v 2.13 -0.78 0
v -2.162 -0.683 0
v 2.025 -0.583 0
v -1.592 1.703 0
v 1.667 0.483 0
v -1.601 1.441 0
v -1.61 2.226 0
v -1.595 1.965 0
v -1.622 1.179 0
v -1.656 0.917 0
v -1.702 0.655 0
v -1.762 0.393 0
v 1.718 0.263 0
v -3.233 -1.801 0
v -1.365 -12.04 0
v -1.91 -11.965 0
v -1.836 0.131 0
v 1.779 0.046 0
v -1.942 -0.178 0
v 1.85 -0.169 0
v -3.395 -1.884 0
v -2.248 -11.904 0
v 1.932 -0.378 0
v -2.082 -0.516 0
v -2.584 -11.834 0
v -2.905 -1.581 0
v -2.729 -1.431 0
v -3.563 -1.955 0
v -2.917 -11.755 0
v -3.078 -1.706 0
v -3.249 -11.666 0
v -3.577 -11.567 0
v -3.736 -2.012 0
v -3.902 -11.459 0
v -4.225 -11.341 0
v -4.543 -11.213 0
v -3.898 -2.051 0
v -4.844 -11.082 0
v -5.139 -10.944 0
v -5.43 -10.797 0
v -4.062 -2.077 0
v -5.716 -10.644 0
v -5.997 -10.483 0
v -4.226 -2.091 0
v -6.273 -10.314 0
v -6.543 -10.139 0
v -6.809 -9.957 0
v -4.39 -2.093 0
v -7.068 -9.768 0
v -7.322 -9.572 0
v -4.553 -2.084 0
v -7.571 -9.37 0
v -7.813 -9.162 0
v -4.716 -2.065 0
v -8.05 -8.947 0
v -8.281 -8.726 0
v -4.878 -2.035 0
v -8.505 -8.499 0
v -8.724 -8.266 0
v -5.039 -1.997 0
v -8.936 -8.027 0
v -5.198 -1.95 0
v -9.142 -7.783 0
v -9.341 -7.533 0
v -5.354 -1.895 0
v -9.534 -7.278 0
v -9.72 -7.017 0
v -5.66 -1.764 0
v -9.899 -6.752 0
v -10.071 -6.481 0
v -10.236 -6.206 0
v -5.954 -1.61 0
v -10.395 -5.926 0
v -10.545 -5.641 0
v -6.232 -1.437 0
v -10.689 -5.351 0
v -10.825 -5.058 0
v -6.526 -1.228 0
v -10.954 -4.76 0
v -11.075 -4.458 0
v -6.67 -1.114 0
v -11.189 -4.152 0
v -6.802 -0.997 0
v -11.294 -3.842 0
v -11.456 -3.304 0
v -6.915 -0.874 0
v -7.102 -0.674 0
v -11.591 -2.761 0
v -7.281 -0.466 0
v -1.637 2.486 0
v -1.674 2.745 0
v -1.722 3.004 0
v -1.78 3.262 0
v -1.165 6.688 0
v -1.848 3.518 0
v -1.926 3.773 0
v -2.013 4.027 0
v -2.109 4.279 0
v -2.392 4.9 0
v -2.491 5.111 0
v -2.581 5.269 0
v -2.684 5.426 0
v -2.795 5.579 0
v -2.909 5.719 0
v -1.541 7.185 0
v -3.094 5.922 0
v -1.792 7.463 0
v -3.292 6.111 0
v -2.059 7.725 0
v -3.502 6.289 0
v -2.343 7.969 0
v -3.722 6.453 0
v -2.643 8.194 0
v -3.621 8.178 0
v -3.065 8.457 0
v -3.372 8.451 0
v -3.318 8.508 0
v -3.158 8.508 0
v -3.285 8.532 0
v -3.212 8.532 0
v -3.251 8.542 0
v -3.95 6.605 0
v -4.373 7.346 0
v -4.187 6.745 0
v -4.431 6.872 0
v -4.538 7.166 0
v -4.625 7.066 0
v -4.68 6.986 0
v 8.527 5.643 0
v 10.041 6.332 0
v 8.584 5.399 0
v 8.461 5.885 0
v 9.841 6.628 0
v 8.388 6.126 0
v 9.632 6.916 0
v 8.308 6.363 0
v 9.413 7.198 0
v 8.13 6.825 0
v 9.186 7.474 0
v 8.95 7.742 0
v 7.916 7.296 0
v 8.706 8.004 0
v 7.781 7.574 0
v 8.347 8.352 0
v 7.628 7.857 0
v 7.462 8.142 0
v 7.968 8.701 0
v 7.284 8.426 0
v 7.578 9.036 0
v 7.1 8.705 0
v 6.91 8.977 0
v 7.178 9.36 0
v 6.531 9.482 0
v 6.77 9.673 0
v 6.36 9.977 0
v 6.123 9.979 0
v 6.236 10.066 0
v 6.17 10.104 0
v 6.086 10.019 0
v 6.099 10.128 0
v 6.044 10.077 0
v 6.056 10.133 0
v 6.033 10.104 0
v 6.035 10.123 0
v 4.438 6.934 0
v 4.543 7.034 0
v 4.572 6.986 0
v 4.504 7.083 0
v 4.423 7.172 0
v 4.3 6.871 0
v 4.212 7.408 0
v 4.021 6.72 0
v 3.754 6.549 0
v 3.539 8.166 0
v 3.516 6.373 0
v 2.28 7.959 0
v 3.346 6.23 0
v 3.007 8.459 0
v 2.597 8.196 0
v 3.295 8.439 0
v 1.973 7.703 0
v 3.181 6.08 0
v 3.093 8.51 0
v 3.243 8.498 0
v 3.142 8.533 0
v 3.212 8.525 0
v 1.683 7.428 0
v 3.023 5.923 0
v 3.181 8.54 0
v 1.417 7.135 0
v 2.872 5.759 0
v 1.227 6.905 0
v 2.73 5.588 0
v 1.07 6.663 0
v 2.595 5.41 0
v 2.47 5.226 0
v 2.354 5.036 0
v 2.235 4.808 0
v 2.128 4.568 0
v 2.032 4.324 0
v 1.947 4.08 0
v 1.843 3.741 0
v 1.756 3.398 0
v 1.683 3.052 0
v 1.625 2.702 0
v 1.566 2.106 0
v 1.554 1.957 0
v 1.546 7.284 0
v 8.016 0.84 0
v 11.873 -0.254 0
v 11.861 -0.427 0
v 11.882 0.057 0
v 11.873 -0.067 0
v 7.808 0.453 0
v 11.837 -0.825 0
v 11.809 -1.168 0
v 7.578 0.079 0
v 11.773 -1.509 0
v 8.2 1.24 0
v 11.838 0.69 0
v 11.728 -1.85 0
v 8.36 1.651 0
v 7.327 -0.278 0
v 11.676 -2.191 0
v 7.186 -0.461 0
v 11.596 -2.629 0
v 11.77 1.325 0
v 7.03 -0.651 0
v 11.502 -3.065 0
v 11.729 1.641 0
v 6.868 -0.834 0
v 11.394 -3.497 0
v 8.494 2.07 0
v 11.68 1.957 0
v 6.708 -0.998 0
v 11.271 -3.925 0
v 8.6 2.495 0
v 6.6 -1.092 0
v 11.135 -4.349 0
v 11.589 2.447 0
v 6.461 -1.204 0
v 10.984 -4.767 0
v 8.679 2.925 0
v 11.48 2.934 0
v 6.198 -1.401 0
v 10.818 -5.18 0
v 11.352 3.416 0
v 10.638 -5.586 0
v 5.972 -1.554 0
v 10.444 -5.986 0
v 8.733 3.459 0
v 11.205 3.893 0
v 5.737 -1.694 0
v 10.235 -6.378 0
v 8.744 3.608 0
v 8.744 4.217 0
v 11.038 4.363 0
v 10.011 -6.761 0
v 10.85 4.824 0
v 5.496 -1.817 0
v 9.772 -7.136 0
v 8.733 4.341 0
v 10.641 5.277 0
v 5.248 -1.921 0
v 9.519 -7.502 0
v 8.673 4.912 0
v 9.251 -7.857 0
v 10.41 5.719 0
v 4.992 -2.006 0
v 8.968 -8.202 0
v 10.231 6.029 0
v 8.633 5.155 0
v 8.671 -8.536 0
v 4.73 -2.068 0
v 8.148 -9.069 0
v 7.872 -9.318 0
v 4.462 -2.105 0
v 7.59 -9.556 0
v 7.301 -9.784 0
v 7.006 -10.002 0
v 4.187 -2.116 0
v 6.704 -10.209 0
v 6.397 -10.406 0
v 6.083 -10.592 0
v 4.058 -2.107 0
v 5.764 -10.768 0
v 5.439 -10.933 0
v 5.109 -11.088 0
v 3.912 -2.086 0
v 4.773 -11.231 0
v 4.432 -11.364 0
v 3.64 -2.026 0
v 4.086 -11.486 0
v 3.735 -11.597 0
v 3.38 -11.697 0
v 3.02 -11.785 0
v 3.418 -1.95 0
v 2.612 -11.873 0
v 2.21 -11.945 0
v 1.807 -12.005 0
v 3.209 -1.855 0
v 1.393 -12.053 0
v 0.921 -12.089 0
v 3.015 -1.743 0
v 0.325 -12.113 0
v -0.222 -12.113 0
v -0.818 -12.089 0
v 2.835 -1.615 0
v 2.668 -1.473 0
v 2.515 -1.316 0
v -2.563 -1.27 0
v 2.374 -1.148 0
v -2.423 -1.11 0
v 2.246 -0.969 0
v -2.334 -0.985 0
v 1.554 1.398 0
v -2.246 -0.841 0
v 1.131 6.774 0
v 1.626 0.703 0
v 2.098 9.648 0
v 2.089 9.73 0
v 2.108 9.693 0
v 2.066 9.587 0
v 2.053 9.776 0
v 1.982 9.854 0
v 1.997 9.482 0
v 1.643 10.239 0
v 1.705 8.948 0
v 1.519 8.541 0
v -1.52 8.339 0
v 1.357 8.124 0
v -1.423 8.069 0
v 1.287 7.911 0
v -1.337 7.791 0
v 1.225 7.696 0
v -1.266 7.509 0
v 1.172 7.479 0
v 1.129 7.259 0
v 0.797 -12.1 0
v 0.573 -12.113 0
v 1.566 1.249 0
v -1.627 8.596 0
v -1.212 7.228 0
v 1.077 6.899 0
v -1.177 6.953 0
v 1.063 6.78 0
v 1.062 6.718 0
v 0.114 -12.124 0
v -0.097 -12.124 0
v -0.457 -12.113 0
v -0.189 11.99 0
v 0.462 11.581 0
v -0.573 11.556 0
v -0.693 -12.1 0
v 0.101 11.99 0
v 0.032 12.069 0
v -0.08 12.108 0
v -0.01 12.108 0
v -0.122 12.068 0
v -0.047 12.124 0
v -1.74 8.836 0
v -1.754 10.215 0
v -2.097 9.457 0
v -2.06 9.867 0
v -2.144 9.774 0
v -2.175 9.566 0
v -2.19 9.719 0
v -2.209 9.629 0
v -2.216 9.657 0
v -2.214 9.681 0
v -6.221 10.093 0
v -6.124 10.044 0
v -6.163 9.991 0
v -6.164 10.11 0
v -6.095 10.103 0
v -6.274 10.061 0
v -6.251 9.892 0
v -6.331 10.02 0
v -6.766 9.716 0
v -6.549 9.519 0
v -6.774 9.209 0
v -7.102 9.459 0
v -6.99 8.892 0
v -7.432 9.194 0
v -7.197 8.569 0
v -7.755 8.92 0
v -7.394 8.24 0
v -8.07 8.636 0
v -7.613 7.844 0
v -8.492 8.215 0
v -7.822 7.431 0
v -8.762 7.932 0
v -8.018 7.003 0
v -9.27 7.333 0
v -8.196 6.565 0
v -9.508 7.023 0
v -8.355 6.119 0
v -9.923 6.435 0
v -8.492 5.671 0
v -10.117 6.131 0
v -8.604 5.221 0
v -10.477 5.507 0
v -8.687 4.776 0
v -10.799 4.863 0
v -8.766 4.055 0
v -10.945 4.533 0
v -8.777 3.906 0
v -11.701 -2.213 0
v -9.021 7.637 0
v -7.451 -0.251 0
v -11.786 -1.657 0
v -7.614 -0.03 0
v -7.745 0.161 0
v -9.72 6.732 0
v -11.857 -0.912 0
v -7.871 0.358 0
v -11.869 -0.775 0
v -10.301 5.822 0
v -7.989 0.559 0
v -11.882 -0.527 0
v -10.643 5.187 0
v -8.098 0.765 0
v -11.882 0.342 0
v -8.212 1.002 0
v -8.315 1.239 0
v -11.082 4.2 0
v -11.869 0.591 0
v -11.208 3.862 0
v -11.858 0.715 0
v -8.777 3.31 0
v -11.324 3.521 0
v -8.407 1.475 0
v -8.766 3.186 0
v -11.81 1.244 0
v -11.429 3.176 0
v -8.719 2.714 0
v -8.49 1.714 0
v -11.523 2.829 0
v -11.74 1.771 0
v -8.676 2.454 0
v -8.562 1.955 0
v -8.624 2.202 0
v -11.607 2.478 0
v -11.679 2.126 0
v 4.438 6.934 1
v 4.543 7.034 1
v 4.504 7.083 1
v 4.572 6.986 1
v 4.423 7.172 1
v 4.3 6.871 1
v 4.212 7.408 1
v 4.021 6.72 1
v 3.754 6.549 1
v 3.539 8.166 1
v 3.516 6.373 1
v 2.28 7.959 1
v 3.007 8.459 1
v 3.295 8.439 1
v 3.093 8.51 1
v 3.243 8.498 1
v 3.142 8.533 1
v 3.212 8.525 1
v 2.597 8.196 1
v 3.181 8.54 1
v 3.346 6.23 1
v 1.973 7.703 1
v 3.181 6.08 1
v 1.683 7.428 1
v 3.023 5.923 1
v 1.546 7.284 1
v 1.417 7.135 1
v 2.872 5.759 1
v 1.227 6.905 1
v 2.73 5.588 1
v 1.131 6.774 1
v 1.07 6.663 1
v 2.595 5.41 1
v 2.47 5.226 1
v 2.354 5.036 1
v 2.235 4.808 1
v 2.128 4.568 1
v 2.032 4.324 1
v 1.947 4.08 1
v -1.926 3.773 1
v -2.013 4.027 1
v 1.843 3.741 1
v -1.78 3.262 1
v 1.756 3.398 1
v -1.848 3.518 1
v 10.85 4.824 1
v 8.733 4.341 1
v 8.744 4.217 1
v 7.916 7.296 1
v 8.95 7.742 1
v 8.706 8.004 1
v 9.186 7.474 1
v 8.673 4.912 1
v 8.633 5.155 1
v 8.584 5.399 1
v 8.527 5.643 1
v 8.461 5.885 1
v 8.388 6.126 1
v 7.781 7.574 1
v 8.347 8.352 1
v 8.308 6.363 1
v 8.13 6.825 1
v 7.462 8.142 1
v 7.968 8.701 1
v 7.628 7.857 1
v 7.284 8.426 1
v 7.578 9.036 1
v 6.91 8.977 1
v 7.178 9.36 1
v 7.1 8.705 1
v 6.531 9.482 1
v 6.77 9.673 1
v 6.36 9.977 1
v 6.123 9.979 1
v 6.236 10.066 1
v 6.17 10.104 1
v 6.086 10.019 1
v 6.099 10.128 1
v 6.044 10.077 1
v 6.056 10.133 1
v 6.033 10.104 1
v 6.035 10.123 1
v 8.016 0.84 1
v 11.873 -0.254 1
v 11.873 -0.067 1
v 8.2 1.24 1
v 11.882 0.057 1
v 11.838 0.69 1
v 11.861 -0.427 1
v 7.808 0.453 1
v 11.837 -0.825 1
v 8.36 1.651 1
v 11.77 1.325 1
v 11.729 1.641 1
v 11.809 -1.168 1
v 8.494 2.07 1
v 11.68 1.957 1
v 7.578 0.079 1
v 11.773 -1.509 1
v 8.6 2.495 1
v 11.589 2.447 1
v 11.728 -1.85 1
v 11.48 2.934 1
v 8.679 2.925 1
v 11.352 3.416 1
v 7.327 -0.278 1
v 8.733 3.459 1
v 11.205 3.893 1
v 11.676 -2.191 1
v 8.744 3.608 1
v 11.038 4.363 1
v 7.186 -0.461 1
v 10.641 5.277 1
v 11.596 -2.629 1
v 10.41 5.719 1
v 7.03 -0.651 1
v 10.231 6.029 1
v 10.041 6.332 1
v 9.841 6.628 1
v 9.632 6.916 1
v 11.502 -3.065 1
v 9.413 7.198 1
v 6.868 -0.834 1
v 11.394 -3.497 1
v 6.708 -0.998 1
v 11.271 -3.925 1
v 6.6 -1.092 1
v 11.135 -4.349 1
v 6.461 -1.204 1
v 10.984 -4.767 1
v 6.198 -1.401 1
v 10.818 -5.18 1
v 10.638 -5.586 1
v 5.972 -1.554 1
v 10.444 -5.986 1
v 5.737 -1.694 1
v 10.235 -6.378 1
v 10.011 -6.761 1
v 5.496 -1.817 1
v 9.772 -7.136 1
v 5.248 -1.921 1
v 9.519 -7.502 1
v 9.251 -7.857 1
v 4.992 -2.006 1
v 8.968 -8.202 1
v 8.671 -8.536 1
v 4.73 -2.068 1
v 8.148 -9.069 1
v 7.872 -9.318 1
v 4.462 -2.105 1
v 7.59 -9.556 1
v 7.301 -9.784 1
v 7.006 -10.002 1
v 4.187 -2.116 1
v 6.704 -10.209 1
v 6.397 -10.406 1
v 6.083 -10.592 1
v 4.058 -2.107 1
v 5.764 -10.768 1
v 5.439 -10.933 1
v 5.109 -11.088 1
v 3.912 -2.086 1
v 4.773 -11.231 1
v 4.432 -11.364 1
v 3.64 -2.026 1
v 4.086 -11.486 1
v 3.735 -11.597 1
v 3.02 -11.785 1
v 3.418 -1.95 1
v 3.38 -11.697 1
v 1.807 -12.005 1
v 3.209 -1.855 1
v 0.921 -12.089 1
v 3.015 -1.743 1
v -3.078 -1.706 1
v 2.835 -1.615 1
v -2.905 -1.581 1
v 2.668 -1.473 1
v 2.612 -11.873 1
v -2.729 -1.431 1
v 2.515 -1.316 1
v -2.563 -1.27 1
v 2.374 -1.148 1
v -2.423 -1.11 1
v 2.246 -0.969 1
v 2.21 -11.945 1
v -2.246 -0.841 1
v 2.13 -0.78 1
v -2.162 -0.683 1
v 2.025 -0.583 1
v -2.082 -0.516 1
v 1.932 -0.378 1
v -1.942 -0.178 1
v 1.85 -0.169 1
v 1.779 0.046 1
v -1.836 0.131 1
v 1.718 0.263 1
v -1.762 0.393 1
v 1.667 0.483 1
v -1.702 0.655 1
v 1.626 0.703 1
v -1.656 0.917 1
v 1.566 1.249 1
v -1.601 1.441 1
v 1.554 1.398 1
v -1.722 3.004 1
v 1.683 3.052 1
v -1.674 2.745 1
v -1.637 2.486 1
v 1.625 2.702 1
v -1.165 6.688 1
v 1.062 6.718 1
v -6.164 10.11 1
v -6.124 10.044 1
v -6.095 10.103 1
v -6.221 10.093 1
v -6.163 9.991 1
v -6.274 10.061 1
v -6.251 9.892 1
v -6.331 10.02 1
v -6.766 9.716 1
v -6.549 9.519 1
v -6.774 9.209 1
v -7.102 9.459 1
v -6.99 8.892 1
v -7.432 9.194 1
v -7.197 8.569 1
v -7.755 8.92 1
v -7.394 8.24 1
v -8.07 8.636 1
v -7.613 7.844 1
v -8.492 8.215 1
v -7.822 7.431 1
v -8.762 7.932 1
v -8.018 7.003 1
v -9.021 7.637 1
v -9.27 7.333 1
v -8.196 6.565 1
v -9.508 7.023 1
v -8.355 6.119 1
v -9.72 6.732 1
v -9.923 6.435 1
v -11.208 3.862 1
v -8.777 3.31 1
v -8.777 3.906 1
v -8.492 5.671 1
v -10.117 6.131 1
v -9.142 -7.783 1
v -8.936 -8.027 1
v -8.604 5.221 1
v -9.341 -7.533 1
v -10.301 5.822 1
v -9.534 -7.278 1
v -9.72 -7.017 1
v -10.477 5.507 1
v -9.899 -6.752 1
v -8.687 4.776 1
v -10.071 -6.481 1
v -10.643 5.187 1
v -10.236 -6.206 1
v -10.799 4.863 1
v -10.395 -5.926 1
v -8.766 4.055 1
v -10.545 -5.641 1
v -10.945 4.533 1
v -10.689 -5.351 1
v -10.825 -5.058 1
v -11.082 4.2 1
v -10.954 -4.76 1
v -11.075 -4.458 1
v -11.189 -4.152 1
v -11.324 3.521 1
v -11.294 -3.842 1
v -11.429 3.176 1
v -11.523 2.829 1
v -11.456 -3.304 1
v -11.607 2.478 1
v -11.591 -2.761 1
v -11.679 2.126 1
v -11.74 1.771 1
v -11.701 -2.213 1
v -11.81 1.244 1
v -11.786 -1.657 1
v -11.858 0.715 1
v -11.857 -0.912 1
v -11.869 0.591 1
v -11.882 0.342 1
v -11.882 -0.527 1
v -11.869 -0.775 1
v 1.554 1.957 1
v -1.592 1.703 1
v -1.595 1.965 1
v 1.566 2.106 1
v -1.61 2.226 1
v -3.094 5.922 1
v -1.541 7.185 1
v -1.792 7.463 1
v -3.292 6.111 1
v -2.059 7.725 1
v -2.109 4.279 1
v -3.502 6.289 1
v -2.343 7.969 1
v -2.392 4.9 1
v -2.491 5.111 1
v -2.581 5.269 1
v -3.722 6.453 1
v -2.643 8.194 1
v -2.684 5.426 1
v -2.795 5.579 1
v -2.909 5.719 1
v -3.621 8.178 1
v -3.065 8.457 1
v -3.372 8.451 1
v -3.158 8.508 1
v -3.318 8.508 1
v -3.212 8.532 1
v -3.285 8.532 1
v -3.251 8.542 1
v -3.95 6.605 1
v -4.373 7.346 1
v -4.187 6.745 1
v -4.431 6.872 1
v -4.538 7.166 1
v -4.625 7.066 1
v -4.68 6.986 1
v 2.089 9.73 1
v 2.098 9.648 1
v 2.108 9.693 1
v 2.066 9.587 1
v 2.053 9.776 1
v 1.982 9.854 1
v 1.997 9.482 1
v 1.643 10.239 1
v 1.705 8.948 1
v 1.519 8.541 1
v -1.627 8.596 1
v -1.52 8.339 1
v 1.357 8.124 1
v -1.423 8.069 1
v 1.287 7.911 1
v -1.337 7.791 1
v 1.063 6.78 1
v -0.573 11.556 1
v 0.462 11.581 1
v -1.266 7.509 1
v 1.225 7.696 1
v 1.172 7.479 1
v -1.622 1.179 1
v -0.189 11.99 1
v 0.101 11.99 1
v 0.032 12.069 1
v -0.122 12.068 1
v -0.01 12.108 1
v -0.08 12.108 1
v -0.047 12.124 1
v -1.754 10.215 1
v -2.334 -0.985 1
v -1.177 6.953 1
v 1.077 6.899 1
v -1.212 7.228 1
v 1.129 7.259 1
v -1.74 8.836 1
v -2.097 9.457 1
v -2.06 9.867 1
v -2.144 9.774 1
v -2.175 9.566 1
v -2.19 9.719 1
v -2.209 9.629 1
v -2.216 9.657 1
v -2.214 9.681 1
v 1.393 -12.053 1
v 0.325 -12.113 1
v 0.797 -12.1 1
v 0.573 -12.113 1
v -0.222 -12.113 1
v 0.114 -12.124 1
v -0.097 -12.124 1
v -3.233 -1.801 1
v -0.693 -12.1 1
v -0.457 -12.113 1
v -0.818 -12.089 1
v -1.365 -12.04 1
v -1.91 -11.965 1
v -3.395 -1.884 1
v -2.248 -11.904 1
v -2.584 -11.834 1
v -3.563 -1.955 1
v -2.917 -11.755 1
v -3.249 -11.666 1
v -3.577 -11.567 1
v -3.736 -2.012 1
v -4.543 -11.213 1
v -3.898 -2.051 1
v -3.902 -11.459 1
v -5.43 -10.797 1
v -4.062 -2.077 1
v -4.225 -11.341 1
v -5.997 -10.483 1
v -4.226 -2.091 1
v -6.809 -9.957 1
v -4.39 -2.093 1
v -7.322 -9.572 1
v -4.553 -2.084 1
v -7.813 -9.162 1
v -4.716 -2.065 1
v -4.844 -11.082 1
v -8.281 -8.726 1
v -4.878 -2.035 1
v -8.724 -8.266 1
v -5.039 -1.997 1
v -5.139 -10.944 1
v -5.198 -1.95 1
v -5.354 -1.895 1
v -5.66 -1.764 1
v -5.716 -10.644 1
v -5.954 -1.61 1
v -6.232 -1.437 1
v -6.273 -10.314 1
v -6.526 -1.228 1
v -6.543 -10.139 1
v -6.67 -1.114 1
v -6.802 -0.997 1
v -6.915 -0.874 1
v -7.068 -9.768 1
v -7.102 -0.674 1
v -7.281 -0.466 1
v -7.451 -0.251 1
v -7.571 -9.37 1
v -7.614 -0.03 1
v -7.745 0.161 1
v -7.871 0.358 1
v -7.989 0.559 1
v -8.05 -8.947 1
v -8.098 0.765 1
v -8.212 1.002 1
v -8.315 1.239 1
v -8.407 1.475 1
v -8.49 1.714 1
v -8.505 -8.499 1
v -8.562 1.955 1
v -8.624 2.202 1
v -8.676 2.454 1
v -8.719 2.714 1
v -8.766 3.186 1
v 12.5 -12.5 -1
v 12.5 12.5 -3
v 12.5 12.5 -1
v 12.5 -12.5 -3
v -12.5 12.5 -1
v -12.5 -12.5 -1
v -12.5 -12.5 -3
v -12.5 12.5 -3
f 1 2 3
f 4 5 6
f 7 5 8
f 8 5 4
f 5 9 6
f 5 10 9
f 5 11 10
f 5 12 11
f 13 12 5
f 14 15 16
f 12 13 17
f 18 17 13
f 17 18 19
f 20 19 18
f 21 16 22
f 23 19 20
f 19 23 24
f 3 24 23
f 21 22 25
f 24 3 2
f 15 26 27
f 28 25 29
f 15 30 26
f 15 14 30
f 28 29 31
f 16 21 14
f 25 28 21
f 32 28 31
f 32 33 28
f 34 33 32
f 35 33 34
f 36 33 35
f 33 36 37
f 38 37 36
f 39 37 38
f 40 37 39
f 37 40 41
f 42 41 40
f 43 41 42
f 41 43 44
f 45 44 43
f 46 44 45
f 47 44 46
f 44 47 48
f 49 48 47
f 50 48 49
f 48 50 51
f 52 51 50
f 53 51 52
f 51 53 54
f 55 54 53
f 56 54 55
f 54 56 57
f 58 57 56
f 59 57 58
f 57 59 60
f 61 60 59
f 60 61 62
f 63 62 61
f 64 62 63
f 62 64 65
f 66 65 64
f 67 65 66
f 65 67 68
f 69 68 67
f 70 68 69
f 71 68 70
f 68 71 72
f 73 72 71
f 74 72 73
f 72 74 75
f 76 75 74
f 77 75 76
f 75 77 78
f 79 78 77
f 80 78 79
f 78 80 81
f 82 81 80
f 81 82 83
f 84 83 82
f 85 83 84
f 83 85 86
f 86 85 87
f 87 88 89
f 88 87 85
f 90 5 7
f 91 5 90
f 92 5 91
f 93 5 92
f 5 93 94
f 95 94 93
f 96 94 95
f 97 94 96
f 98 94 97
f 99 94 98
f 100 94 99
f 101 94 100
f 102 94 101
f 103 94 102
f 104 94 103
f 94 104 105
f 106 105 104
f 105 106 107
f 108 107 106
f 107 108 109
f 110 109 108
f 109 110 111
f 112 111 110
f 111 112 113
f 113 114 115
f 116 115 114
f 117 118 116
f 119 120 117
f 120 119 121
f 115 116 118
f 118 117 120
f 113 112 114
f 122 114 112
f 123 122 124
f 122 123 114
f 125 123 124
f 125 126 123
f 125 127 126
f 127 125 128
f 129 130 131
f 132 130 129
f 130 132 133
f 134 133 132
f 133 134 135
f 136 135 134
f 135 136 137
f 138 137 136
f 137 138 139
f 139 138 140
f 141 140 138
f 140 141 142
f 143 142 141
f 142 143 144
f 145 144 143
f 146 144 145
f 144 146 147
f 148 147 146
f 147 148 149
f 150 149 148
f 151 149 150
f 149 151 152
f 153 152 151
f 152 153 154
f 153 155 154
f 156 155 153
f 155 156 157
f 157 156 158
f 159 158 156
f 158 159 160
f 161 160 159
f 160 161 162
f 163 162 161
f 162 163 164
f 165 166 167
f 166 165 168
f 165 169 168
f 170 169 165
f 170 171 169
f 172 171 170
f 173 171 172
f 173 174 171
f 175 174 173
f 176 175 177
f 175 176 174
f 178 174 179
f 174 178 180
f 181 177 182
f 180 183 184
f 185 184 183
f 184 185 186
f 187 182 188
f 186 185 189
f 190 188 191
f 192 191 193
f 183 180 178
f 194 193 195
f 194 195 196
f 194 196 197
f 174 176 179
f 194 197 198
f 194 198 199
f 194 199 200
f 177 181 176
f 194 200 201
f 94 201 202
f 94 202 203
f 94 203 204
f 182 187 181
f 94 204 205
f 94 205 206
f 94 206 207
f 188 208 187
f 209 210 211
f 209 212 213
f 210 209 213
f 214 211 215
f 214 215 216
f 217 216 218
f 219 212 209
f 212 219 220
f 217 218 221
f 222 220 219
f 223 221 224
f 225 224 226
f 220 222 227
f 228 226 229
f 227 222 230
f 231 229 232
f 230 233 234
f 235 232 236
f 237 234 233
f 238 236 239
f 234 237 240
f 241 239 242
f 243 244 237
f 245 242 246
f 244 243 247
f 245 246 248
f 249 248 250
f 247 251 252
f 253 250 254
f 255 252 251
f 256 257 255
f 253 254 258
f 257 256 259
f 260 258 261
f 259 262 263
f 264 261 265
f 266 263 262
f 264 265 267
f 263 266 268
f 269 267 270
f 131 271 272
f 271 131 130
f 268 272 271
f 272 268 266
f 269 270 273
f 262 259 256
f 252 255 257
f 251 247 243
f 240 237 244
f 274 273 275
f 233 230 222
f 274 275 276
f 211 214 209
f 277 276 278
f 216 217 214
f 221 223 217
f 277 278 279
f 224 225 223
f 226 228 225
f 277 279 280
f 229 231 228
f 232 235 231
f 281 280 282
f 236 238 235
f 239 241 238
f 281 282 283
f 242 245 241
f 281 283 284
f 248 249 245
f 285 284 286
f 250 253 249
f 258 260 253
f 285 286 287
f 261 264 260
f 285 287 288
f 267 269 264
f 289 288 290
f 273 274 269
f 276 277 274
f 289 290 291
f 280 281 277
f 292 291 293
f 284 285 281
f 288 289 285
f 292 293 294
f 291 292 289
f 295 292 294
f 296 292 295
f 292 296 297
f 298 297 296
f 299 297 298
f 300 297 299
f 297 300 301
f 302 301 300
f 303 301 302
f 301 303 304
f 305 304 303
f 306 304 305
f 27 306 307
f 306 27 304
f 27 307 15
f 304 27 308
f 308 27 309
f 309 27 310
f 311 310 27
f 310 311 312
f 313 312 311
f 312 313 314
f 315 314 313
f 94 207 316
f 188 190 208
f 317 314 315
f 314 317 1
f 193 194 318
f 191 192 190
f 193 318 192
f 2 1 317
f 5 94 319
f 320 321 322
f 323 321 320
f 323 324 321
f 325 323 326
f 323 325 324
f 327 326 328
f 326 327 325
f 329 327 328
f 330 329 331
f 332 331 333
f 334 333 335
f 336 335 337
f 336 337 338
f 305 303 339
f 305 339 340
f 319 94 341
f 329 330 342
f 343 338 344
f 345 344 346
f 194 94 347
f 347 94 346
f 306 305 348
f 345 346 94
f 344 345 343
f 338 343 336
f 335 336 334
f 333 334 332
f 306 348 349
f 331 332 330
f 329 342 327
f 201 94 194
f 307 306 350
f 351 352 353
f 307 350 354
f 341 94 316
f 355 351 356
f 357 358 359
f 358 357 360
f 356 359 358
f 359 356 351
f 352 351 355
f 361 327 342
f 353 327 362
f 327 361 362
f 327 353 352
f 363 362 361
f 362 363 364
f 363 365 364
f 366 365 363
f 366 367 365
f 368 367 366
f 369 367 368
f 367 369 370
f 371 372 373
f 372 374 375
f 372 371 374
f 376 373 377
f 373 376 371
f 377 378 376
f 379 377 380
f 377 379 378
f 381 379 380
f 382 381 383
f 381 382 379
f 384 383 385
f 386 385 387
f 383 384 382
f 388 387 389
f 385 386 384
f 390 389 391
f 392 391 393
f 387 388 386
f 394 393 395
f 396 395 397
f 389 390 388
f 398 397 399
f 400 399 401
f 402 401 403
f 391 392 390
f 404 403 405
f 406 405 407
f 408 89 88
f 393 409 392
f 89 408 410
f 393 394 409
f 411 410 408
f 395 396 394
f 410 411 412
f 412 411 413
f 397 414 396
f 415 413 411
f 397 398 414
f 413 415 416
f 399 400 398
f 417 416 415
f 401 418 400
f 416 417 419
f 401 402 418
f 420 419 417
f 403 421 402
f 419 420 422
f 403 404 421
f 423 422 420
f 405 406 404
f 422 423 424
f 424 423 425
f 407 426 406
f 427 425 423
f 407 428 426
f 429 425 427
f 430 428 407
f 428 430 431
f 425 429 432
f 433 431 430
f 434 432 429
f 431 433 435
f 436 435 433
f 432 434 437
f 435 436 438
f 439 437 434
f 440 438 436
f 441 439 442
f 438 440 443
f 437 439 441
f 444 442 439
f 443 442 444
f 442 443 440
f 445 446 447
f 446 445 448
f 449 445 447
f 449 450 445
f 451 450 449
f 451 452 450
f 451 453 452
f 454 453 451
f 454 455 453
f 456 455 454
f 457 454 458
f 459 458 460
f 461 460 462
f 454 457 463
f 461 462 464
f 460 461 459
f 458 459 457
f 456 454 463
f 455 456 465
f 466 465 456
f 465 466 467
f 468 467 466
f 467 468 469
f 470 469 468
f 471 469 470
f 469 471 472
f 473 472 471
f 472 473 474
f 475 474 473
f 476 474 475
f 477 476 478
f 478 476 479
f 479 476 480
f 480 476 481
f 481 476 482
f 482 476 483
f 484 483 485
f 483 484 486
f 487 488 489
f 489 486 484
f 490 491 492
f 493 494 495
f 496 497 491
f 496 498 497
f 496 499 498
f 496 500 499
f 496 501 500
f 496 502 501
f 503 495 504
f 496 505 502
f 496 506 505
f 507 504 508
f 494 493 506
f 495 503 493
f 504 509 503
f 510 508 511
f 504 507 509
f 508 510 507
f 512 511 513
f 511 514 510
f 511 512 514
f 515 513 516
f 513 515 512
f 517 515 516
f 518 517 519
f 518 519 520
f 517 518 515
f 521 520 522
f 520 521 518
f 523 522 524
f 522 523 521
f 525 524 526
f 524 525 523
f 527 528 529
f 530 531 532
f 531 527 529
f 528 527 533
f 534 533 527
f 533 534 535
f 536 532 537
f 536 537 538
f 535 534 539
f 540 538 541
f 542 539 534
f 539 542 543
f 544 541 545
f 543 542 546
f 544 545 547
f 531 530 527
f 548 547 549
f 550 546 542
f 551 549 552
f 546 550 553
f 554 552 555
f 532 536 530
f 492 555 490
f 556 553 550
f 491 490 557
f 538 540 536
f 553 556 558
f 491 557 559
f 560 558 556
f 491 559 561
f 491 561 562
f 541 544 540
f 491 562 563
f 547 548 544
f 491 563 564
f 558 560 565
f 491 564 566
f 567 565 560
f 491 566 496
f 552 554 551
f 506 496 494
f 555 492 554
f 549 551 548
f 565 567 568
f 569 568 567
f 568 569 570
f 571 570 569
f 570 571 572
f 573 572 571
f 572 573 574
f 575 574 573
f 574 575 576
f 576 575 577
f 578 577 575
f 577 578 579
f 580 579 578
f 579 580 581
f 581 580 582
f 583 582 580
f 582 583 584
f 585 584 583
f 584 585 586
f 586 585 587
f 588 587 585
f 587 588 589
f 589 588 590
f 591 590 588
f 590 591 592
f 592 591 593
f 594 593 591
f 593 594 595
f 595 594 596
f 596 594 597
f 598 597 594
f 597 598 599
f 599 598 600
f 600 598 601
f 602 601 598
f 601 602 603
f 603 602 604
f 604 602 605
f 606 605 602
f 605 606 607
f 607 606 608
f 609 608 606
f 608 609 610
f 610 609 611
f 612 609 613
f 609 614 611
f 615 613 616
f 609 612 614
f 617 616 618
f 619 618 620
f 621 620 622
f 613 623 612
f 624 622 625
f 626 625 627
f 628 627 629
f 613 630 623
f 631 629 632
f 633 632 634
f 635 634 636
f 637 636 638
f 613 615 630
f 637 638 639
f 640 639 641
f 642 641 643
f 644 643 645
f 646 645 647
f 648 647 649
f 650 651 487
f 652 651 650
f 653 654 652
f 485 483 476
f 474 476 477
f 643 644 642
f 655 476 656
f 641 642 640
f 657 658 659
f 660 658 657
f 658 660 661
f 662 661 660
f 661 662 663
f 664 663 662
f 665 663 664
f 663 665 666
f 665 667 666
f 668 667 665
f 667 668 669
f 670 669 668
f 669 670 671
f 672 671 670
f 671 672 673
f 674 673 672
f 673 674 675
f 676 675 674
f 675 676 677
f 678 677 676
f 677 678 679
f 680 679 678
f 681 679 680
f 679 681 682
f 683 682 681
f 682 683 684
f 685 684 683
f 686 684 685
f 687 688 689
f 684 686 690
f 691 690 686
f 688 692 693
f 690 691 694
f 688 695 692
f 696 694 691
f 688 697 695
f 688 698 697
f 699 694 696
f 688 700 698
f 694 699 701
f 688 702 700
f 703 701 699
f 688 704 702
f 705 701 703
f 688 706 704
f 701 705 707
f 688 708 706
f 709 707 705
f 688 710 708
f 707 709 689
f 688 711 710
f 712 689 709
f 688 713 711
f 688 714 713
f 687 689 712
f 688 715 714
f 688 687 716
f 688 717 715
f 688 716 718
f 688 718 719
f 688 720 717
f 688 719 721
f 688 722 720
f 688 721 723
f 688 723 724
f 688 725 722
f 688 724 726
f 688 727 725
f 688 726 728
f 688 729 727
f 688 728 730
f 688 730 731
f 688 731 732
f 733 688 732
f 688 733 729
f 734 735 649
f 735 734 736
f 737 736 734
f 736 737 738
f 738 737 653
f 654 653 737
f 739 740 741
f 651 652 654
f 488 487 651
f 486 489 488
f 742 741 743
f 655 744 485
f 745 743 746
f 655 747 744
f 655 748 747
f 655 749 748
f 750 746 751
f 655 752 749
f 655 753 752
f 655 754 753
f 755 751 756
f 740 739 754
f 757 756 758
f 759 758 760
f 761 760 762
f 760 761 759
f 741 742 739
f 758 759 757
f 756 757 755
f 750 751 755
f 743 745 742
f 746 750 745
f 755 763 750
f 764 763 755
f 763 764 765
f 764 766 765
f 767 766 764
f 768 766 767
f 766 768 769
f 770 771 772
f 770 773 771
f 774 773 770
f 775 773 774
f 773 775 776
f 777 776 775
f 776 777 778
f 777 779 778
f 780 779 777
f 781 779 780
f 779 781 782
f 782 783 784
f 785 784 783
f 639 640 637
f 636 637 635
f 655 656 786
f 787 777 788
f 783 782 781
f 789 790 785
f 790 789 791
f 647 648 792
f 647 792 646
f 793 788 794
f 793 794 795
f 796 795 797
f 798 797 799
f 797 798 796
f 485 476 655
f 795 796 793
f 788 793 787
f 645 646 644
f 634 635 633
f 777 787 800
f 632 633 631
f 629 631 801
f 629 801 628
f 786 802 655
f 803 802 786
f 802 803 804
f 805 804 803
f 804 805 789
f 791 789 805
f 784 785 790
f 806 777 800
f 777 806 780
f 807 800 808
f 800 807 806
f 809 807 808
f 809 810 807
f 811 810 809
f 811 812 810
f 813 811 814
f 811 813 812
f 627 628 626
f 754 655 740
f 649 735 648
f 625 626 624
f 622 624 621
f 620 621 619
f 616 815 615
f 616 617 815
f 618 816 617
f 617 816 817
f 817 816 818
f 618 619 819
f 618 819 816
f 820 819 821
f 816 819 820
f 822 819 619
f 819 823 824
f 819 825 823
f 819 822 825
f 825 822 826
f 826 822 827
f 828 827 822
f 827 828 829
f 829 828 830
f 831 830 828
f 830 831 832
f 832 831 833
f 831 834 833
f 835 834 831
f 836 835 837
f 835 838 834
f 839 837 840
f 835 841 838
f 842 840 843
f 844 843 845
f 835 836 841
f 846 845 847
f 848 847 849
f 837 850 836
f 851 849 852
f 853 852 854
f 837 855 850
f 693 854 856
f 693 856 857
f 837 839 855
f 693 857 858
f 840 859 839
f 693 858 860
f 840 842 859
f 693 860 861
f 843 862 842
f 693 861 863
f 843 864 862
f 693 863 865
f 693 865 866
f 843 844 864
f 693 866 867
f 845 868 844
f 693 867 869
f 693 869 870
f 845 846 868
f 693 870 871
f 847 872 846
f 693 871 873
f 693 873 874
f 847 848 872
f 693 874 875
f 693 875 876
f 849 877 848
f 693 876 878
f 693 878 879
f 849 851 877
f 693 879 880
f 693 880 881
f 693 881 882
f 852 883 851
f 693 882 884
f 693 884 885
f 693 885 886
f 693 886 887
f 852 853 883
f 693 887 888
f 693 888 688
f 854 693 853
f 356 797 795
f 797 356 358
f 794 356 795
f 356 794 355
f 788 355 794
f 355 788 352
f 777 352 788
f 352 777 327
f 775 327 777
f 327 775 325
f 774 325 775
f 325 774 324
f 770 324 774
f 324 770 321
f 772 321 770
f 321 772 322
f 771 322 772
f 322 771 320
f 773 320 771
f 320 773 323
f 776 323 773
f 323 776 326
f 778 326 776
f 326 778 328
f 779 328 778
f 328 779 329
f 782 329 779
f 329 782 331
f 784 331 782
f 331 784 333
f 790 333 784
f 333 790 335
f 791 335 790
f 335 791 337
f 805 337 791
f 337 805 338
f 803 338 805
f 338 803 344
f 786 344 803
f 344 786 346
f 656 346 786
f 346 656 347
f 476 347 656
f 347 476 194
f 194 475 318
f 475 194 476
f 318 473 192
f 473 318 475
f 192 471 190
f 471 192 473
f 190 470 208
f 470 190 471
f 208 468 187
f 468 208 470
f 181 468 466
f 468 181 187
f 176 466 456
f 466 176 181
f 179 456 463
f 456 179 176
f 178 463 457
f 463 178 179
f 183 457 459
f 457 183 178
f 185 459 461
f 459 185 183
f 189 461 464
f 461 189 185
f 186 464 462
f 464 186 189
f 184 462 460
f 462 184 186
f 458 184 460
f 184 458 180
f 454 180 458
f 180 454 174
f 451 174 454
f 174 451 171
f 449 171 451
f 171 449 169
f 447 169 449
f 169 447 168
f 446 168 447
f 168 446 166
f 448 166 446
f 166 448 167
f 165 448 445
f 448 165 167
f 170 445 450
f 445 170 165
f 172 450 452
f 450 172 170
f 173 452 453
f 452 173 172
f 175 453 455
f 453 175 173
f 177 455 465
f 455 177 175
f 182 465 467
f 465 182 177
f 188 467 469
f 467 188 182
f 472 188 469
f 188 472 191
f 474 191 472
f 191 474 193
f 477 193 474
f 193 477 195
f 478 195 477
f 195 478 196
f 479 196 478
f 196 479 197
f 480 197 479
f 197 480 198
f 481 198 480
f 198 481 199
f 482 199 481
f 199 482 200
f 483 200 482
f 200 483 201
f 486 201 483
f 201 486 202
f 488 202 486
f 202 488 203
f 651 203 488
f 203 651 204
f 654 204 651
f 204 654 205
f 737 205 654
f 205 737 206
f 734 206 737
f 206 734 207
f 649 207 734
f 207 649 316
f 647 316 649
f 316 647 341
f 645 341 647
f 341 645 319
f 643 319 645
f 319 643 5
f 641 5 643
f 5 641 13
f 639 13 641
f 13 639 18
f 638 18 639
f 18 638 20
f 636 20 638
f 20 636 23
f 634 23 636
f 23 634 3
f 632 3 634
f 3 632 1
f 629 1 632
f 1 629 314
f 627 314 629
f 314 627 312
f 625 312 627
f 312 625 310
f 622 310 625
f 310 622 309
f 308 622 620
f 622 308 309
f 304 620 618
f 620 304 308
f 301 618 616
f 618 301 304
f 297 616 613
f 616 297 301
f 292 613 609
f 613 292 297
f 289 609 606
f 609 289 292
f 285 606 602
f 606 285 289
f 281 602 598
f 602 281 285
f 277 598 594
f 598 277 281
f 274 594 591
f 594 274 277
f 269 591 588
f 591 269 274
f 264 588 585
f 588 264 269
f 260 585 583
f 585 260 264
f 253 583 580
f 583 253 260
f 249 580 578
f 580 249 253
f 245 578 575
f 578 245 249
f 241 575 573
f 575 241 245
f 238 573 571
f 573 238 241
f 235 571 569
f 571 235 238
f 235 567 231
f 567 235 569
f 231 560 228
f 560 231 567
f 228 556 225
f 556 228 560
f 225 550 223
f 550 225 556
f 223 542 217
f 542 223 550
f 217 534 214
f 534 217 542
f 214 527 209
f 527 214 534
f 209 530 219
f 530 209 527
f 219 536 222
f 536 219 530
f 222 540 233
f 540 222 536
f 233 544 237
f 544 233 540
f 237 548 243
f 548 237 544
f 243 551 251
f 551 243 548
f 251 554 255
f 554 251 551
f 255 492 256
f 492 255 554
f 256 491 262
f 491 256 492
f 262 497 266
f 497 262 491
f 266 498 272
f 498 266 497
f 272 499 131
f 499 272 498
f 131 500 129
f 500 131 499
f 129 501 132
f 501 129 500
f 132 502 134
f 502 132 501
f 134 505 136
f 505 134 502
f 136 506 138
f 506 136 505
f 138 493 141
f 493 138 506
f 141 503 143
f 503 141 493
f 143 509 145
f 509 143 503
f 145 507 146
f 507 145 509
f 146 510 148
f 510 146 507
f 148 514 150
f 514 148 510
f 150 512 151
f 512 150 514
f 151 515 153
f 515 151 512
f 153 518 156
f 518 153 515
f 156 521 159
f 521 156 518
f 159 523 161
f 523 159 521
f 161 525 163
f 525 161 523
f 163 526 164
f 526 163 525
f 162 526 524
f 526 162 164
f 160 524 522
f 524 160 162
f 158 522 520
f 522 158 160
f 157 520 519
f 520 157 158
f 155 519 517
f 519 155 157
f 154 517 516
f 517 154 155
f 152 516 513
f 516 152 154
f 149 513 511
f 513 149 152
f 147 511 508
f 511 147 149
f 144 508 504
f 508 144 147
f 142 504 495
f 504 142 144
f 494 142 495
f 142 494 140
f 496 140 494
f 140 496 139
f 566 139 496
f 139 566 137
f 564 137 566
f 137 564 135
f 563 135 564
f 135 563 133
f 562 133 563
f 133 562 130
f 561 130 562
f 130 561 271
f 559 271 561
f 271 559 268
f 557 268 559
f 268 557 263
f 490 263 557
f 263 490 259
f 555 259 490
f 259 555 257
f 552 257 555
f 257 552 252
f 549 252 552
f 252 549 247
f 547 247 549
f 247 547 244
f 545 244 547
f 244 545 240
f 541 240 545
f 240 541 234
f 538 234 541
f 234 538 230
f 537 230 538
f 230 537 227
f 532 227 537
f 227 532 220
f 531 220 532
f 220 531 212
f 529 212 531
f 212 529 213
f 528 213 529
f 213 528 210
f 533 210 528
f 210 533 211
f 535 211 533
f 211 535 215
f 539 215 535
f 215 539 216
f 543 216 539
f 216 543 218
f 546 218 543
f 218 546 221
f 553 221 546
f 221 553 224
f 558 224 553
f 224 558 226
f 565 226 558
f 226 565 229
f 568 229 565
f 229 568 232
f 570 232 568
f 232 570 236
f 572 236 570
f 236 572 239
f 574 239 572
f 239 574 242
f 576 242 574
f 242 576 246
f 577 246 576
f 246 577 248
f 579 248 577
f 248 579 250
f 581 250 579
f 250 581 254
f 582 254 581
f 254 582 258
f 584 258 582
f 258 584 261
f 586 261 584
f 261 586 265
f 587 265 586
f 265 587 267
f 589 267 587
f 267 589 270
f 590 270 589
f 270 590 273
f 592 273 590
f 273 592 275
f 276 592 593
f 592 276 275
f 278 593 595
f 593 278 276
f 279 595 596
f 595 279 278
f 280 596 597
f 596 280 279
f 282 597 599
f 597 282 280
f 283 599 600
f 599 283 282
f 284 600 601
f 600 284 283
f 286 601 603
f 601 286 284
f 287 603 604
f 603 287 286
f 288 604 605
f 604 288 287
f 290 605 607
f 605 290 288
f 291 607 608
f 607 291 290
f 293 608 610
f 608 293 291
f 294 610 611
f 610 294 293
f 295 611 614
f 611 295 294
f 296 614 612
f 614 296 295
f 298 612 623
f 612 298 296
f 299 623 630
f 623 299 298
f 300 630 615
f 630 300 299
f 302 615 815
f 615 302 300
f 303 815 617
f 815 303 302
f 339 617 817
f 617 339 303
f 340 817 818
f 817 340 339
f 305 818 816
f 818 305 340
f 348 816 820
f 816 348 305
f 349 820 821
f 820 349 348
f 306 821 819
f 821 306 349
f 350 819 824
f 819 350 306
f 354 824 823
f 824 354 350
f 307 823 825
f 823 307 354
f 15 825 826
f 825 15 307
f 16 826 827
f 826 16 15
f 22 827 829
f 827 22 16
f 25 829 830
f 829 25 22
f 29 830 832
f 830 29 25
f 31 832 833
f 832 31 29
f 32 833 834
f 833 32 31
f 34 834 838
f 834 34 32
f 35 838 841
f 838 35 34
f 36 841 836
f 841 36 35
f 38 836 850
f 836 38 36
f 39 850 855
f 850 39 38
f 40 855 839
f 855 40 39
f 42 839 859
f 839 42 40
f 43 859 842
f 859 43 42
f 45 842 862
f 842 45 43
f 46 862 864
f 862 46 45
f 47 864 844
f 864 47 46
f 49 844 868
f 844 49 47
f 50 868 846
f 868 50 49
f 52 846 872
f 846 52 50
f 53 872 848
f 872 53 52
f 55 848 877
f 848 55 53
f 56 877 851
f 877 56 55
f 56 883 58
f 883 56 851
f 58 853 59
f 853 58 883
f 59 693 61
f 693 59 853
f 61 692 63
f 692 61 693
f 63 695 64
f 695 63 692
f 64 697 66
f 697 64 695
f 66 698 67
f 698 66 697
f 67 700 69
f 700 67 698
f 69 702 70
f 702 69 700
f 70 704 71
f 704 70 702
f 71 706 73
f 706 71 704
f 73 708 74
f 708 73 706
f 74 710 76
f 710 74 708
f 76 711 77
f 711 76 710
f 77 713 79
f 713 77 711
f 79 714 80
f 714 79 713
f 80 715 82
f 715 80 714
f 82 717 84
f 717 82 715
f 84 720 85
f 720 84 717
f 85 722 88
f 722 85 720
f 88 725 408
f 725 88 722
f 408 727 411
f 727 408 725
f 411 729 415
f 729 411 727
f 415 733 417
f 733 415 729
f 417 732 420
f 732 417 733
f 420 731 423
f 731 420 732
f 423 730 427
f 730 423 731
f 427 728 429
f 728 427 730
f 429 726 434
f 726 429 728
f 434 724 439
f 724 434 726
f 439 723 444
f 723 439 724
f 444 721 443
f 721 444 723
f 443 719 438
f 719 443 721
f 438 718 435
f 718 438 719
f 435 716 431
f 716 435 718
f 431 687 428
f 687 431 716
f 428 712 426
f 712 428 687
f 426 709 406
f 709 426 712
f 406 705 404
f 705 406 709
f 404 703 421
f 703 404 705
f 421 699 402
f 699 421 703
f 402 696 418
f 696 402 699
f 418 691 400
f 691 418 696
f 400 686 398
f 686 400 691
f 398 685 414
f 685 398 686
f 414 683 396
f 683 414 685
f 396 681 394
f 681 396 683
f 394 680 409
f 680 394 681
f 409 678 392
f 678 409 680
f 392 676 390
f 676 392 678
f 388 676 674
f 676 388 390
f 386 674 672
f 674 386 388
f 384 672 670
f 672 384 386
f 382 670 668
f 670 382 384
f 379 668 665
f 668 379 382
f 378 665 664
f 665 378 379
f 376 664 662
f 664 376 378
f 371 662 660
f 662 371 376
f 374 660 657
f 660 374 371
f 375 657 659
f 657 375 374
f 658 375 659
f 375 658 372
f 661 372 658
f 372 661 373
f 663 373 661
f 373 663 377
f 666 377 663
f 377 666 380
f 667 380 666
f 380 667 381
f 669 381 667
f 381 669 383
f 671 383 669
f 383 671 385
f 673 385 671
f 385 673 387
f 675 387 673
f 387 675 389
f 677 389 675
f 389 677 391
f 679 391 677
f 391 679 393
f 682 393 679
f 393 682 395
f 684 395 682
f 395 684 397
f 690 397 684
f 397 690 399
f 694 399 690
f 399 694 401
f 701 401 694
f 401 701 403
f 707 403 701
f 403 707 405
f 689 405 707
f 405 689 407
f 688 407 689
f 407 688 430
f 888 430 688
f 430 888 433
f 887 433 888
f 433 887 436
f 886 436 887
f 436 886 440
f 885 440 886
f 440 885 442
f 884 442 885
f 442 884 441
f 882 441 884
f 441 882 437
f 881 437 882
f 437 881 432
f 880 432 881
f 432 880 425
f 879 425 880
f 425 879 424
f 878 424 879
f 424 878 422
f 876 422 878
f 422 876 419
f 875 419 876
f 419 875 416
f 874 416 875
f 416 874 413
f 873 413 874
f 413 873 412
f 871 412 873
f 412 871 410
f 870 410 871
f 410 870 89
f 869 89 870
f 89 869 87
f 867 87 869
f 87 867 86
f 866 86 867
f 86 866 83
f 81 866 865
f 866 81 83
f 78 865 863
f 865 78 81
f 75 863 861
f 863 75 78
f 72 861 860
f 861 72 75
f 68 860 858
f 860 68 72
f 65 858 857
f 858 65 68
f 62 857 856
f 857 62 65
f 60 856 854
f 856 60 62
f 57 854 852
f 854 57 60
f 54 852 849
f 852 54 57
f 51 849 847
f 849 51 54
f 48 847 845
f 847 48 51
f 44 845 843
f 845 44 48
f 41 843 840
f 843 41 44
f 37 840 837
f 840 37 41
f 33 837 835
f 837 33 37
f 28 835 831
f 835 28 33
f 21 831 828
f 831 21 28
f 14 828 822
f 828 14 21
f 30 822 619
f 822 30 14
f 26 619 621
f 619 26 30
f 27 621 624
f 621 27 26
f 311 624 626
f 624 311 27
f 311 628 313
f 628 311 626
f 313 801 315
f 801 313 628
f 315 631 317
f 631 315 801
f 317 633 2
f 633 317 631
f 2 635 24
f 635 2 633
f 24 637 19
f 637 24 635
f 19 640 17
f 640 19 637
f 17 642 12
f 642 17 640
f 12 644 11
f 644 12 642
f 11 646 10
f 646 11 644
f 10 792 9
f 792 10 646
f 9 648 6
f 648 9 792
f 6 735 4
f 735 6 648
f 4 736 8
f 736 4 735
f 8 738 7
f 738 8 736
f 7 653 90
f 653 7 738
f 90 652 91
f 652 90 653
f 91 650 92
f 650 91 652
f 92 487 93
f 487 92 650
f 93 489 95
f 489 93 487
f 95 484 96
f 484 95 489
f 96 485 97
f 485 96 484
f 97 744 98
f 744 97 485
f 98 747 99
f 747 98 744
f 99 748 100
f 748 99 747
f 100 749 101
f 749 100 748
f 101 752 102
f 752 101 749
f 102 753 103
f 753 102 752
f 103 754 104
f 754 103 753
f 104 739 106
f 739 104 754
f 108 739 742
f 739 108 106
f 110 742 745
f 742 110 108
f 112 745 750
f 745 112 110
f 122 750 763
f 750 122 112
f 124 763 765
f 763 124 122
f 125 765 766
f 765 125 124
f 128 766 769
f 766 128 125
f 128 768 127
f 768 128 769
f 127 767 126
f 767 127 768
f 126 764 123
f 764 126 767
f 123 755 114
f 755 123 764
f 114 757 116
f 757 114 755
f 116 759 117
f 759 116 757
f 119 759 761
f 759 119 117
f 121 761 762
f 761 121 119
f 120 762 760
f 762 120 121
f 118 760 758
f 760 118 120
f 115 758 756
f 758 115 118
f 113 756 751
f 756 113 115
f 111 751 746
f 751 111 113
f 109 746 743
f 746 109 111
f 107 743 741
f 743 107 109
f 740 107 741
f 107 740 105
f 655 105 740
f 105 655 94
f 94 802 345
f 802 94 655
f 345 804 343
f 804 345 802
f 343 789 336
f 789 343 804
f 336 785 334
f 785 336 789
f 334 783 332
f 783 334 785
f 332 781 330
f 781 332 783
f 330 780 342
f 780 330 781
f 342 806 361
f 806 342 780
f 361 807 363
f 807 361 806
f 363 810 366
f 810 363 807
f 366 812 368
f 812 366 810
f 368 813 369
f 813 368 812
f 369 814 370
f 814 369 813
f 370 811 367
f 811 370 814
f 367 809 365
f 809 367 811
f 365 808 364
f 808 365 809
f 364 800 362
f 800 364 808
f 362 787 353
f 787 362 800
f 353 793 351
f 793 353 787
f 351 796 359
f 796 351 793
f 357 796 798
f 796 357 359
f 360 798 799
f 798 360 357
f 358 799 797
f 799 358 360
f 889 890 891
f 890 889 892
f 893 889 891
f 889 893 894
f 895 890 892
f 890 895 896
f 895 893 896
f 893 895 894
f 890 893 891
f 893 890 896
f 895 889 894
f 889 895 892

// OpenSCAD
// file: ../thumbnail-background.scad
module thumbnailBackground()
{
	color("green")
	translate([0, 0, -2])
	cube([25, 25, 2], center=true);	
}
// main file
use <rebel-alliance.scad>
use <../thumbnail-background.scad>

rebelAllianceThumbnail(height=1);

thumbnailBackground();
